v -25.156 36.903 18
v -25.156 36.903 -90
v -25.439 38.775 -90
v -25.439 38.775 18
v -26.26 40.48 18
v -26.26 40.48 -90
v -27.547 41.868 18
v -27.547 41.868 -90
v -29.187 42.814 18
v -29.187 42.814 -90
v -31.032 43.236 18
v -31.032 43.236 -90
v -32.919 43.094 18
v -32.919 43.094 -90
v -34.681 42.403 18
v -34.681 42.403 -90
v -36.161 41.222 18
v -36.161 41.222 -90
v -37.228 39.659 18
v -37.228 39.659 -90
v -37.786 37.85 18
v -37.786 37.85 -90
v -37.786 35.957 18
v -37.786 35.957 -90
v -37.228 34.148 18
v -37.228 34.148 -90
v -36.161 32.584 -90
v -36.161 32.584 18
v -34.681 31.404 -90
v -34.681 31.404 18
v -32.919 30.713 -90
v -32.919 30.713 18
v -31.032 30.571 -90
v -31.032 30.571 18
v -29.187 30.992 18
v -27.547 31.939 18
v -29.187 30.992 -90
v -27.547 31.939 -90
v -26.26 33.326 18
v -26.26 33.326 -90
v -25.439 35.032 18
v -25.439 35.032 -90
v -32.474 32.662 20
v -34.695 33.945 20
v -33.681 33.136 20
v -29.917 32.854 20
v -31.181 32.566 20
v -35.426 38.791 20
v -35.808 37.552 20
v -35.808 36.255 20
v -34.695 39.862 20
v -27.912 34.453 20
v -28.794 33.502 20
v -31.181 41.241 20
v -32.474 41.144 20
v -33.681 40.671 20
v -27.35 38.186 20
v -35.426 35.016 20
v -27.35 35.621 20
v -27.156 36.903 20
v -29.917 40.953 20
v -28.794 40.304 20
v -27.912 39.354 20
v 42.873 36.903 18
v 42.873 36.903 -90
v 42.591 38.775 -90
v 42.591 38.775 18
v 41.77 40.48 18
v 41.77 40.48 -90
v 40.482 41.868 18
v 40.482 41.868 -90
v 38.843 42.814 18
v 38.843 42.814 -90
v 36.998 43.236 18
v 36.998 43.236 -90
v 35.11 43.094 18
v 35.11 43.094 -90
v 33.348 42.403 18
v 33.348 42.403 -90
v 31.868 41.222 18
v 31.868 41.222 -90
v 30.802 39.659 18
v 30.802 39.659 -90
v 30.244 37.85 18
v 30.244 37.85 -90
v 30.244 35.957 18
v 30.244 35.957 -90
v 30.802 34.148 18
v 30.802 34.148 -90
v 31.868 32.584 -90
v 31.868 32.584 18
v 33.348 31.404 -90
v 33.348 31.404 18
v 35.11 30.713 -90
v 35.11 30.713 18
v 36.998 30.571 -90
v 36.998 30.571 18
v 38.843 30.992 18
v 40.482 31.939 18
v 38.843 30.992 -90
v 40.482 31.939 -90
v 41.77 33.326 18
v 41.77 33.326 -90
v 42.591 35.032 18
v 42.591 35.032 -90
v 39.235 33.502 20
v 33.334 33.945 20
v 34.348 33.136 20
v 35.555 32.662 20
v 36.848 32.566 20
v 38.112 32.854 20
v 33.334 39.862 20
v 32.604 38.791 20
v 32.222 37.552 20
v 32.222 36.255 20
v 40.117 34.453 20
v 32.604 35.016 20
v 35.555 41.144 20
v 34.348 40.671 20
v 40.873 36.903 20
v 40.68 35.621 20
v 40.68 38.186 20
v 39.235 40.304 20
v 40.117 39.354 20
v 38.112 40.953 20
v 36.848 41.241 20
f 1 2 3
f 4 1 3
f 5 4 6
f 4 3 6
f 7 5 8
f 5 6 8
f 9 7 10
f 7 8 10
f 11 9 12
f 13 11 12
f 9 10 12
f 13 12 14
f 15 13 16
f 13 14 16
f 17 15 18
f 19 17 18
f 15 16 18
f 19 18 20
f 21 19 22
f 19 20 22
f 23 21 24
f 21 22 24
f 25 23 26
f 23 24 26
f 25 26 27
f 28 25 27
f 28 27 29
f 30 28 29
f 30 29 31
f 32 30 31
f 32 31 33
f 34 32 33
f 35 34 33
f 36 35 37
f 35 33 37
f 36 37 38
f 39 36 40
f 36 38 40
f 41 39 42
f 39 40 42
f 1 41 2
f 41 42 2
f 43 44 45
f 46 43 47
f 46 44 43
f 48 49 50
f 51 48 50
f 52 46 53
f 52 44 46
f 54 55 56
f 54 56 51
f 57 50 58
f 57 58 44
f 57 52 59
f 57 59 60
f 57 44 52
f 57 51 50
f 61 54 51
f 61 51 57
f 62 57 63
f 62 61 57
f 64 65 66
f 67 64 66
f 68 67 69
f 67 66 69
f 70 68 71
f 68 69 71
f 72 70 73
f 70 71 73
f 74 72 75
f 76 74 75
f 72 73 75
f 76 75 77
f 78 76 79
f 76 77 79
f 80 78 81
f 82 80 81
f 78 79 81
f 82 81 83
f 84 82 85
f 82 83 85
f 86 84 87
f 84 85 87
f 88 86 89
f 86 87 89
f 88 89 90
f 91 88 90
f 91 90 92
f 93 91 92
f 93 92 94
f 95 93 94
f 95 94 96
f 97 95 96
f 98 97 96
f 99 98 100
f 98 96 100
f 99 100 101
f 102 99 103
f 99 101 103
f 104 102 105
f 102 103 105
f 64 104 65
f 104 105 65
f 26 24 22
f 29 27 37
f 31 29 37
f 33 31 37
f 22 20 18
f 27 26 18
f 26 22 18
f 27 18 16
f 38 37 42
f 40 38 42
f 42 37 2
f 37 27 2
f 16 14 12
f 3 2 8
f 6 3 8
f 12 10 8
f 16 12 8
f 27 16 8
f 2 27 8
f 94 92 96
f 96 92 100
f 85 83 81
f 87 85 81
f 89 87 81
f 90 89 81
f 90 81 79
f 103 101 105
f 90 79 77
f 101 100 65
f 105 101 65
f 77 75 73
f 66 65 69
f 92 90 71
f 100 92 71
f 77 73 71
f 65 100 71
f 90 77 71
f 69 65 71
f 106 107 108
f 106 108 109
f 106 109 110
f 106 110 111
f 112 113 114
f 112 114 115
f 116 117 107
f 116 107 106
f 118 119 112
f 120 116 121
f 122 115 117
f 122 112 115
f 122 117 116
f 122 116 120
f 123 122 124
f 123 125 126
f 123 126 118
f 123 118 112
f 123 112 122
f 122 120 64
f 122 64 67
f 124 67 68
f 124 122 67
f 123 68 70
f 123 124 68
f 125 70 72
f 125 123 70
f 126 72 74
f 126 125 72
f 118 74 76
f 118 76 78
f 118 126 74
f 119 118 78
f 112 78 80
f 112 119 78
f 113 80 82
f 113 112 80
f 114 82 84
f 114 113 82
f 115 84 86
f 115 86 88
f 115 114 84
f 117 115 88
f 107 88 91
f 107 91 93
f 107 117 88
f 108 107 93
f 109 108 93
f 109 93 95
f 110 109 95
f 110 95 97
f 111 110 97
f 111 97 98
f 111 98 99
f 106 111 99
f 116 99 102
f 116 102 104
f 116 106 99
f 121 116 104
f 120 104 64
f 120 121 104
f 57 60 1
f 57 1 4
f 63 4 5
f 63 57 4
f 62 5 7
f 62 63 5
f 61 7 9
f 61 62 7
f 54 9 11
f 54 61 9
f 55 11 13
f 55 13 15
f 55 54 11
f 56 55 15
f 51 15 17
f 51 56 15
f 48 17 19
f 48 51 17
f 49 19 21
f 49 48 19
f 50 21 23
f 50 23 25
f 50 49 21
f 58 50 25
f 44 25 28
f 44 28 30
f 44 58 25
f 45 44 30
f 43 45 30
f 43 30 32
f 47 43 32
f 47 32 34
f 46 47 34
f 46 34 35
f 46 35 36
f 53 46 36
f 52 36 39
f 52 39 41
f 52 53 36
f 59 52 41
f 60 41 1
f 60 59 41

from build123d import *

# Parameters (mm, degrees)
BOSS_EXTRUDE1_DEPTH        = 20
BOSS_EXTRUDE1_DEPTH_BACK   = 90
SKETCH1_R                  = 6.35
BOSS_EXTRUDE1_2_DEPTH      = 20
BOSS_EXTRUDE1_2_DEPTH_BACK = 90
CHAMFER3_SIZE              = 2
CHAMFER4_SIZE              = 2


with BuildPart() as part:
    # Sketch1 → Boss-Extrude1 (new, two sides: drawn at the far end of the back side and taken through both)
    with BuildSketch(Plane.XY.offset(-BOSS_EXTRUDE1_DEPTH_BACK)):
        with Locations((-31.506467261, 36.903395316)):
            Circle(SKETCH1_R)
    extrude(amount=BOSS_EXTRUDE1_DEPTH + BOSS_EXTRUDE1_DEPTH_BACK)

    # Chamfer3
    chamfer3_edges = [part.edges().sort_by_distance(p)[0] for p in [
        (-37.856467261, 36.903395316, 20),
    ]]
    chamfer(chamfer3_edges, length=CHAMFER3_SIZE)


with BuildPart() as body_2:
    # Sketch1 → Boss-Extrude1 2 (new, two sides: drawn at the far end of the back side and taken through both)
    with BuildSketch(Plane.XY.offset(-BOSS_EXTRUDE1_2_DEPTH_BACK)):
        with Locations((36.522969991, 36.903395316)):
            Circle(SKETCH1_R)
    extrude(amount=BOSS_EXTRUDE1_2_DEPTH + BOSS_EXTRUDE1_2_DEPTH_BACK)

    # Chamfer4
    chamfer4_edges = [body_2.edges().sort_by_distance(p)[0] for p in [
        (30.172969991, 36.903395316, 20),
    ]]
    chamfer(chamfer4_edges, length=CHAMFER4_SIZE)


solid = Compound([part.part, body_2.part])
